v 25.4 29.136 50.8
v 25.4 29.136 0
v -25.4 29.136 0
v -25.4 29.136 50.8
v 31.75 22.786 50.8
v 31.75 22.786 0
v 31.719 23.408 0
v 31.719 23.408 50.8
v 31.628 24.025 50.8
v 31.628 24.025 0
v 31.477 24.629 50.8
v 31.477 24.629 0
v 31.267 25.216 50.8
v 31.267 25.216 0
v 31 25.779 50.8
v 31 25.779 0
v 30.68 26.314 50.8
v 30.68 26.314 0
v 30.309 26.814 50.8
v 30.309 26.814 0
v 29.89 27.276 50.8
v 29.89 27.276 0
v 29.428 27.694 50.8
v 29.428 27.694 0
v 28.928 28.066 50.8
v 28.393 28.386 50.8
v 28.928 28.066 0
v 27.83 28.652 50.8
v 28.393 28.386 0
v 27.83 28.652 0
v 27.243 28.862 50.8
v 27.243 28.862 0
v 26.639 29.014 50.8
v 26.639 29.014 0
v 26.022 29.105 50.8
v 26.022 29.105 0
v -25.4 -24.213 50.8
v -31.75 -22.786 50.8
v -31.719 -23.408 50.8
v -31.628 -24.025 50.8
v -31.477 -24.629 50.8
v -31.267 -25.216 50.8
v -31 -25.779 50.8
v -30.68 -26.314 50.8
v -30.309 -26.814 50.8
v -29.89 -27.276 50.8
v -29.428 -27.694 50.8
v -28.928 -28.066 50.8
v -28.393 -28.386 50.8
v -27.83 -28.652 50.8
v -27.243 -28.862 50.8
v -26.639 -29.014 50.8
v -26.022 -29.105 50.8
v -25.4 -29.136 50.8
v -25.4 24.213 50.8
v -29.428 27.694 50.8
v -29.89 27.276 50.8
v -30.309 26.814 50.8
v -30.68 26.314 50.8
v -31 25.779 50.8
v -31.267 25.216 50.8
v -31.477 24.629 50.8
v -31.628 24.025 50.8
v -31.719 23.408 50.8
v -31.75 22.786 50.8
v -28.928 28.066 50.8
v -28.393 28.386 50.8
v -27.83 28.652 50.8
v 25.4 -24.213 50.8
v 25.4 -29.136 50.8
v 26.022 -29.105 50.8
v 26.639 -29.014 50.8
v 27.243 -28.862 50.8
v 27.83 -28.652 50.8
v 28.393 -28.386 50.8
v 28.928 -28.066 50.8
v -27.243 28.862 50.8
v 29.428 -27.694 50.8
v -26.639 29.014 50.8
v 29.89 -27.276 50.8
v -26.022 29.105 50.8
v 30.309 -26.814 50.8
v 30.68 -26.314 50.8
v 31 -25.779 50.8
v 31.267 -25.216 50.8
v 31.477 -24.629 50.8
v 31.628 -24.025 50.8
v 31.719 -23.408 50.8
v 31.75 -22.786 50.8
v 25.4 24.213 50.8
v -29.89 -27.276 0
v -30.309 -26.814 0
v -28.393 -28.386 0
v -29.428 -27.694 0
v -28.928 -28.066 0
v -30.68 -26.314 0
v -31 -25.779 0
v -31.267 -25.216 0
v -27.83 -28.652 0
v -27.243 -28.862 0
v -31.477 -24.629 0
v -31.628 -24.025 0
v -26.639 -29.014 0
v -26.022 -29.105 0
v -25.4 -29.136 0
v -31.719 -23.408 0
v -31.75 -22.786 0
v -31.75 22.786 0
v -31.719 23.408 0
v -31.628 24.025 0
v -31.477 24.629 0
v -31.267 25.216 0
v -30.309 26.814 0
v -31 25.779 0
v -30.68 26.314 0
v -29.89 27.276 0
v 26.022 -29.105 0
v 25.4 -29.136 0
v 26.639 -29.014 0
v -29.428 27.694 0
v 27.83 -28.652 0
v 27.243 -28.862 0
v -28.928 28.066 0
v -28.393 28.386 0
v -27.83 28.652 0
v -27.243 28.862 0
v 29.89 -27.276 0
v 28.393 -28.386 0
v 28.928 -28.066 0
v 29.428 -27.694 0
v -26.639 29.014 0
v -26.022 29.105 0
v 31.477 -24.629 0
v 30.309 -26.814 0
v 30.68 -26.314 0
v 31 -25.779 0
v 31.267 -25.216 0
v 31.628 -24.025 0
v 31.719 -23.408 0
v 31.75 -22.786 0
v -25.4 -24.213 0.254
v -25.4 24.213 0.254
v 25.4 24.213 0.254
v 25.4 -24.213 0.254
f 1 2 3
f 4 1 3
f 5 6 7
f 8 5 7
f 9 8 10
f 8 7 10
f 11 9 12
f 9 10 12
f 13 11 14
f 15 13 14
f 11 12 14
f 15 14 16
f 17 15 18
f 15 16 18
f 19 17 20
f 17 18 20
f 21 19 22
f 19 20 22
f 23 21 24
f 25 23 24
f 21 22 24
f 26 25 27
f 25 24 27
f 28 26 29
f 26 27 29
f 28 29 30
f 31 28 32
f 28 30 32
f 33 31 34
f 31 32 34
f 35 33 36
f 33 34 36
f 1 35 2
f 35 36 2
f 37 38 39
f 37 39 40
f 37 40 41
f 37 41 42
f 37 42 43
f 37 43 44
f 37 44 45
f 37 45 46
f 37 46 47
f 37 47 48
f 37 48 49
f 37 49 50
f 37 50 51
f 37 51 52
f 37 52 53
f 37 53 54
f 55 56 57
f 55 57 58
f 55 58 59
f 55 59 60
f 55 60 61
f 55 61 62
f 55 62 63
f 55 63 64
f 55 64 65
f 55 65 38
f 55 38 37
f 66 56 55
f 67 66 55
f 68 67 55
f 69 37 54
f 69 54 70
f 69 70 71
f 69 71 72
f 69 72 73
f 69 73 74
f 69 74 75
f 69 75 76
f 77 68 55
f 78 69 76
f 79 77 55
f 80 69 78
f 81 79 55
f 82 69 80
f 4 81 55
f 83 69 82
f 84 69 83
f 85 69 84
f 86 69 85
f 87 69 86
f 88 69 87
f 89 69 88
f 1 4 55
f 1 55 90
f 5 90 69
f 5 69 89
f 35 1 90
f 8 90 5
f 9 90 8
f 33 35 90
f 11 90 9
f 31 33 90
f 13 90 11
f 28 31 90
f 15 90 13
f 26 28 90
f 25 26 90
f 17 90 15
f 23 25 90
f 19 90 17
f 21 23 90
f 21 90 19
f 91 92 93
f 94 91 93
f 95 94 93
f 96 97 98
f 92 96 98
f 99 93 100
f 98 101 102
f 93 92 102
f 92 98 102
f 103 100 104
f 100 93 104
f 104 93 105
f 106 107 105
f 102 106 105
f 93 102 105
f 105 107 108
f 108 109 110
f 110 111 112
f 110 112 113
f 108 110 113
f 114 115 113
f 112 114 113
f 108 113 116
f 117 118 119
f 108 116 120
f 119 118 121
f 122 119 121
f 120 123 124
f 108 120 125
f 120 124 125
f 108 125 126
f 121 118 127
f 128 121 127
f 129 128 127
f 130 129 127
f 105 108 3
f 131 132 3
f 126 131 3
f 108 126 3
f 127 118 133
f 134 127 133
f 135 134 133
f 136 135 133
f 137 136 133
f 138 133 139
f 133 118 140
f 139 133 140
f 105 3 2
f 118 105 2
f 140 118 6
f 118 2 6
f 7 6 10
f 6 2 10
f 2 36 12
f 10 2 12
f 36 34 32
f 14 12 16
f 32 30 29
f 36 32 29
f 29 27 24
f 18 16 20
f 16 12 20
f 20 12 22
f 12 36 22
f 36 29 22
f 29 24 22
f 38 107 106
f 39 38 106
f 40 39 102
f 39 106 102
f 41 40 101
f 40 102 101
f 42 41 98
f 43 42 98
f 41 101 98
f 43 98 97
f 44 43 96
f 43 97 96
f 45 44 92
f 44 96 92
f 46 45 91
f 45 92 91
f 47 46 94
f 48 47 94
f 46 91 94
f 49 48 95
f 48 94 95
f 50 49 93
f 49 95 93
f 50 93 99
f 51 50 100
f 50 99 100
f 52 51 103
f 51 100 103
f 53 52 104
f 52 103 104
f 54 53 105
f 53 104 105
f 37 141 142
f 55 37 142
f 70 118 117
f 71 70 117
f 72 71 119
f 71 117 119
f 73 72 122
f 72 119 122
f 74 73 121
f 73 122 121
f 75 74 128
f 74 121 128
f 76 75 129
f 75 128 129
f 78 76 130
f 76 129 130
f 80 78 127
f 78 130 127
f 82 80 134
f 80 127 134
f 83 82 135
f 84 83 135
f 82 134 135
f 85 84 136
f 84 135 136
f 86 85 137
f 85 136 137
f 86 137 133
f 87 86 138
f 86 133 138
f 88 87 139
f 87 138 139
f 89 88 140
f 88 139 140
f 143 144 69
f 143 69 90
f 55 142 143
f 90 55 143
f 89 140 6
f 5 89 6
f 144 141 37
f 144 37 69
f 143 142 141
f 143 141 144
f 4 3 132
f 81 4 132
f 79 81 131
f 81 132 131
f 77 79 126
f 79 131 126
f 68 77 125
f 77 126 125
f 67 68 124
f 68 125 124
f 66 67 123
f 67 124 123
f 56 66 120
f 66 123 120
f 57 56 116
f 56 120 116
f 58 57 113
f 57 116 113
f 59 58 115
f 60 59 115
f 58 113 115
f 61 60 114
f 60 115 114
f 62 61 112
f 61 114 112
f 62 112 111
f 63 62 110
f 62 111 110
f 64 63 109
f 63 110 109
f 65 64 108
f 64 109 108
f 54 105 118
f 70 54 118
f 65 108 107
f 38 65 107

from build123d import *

# Parameters (mm, degrees)
F0_W     = 50.8
F0_H     = 48.42591
F1_DEPTH = 50.8
F2_W     = 51.555392
F2_H     = 49.770784
F3_DEPTH = 0.254


with BuildPart() as f1:
    # F0 (on Top) → F1 (new body)
    with BuildSketch(Plane.XY):
        with BuildLine():
            ThreePointArc((31.75, 22.785854), (29.890128, 27.275982), (25.4, 29.135854))
            Line((25.4, 29.135854), (-25.4, 29.135854))
            ThreePointArc((-25.4, 29.135854), (-29.890128, 27.275982), (-31.75, 22.785854))
            Line((-31.75, 22.785854), (-31.75, -22.785854))
            ThreePointArc((-31.75, -22.785854), (-29.890128, -27.275982), (-25.4, -29.135854))
            Line((-25.4, -29.135854), (25.4, -29.135854))
            ThreePointArc((25.4, -29.135854), (29.890128, -27.275982), (31.75, -22.785854))
            Line((31.75, -22.785854), (31.75, 22.785854))
        make_face()
        Rectangle(F0_W, F0_H, mode=Mode.SUBTRACT)
    extrude(amount=F1_DEPTH)

    # F2 (on Top) → F3 (join)
    with BuildSketch(Plane.XY):
        Rectangle(F2_W, F2_H)
    extrude(amount=F3_DEPTH)


solid = f1.part
